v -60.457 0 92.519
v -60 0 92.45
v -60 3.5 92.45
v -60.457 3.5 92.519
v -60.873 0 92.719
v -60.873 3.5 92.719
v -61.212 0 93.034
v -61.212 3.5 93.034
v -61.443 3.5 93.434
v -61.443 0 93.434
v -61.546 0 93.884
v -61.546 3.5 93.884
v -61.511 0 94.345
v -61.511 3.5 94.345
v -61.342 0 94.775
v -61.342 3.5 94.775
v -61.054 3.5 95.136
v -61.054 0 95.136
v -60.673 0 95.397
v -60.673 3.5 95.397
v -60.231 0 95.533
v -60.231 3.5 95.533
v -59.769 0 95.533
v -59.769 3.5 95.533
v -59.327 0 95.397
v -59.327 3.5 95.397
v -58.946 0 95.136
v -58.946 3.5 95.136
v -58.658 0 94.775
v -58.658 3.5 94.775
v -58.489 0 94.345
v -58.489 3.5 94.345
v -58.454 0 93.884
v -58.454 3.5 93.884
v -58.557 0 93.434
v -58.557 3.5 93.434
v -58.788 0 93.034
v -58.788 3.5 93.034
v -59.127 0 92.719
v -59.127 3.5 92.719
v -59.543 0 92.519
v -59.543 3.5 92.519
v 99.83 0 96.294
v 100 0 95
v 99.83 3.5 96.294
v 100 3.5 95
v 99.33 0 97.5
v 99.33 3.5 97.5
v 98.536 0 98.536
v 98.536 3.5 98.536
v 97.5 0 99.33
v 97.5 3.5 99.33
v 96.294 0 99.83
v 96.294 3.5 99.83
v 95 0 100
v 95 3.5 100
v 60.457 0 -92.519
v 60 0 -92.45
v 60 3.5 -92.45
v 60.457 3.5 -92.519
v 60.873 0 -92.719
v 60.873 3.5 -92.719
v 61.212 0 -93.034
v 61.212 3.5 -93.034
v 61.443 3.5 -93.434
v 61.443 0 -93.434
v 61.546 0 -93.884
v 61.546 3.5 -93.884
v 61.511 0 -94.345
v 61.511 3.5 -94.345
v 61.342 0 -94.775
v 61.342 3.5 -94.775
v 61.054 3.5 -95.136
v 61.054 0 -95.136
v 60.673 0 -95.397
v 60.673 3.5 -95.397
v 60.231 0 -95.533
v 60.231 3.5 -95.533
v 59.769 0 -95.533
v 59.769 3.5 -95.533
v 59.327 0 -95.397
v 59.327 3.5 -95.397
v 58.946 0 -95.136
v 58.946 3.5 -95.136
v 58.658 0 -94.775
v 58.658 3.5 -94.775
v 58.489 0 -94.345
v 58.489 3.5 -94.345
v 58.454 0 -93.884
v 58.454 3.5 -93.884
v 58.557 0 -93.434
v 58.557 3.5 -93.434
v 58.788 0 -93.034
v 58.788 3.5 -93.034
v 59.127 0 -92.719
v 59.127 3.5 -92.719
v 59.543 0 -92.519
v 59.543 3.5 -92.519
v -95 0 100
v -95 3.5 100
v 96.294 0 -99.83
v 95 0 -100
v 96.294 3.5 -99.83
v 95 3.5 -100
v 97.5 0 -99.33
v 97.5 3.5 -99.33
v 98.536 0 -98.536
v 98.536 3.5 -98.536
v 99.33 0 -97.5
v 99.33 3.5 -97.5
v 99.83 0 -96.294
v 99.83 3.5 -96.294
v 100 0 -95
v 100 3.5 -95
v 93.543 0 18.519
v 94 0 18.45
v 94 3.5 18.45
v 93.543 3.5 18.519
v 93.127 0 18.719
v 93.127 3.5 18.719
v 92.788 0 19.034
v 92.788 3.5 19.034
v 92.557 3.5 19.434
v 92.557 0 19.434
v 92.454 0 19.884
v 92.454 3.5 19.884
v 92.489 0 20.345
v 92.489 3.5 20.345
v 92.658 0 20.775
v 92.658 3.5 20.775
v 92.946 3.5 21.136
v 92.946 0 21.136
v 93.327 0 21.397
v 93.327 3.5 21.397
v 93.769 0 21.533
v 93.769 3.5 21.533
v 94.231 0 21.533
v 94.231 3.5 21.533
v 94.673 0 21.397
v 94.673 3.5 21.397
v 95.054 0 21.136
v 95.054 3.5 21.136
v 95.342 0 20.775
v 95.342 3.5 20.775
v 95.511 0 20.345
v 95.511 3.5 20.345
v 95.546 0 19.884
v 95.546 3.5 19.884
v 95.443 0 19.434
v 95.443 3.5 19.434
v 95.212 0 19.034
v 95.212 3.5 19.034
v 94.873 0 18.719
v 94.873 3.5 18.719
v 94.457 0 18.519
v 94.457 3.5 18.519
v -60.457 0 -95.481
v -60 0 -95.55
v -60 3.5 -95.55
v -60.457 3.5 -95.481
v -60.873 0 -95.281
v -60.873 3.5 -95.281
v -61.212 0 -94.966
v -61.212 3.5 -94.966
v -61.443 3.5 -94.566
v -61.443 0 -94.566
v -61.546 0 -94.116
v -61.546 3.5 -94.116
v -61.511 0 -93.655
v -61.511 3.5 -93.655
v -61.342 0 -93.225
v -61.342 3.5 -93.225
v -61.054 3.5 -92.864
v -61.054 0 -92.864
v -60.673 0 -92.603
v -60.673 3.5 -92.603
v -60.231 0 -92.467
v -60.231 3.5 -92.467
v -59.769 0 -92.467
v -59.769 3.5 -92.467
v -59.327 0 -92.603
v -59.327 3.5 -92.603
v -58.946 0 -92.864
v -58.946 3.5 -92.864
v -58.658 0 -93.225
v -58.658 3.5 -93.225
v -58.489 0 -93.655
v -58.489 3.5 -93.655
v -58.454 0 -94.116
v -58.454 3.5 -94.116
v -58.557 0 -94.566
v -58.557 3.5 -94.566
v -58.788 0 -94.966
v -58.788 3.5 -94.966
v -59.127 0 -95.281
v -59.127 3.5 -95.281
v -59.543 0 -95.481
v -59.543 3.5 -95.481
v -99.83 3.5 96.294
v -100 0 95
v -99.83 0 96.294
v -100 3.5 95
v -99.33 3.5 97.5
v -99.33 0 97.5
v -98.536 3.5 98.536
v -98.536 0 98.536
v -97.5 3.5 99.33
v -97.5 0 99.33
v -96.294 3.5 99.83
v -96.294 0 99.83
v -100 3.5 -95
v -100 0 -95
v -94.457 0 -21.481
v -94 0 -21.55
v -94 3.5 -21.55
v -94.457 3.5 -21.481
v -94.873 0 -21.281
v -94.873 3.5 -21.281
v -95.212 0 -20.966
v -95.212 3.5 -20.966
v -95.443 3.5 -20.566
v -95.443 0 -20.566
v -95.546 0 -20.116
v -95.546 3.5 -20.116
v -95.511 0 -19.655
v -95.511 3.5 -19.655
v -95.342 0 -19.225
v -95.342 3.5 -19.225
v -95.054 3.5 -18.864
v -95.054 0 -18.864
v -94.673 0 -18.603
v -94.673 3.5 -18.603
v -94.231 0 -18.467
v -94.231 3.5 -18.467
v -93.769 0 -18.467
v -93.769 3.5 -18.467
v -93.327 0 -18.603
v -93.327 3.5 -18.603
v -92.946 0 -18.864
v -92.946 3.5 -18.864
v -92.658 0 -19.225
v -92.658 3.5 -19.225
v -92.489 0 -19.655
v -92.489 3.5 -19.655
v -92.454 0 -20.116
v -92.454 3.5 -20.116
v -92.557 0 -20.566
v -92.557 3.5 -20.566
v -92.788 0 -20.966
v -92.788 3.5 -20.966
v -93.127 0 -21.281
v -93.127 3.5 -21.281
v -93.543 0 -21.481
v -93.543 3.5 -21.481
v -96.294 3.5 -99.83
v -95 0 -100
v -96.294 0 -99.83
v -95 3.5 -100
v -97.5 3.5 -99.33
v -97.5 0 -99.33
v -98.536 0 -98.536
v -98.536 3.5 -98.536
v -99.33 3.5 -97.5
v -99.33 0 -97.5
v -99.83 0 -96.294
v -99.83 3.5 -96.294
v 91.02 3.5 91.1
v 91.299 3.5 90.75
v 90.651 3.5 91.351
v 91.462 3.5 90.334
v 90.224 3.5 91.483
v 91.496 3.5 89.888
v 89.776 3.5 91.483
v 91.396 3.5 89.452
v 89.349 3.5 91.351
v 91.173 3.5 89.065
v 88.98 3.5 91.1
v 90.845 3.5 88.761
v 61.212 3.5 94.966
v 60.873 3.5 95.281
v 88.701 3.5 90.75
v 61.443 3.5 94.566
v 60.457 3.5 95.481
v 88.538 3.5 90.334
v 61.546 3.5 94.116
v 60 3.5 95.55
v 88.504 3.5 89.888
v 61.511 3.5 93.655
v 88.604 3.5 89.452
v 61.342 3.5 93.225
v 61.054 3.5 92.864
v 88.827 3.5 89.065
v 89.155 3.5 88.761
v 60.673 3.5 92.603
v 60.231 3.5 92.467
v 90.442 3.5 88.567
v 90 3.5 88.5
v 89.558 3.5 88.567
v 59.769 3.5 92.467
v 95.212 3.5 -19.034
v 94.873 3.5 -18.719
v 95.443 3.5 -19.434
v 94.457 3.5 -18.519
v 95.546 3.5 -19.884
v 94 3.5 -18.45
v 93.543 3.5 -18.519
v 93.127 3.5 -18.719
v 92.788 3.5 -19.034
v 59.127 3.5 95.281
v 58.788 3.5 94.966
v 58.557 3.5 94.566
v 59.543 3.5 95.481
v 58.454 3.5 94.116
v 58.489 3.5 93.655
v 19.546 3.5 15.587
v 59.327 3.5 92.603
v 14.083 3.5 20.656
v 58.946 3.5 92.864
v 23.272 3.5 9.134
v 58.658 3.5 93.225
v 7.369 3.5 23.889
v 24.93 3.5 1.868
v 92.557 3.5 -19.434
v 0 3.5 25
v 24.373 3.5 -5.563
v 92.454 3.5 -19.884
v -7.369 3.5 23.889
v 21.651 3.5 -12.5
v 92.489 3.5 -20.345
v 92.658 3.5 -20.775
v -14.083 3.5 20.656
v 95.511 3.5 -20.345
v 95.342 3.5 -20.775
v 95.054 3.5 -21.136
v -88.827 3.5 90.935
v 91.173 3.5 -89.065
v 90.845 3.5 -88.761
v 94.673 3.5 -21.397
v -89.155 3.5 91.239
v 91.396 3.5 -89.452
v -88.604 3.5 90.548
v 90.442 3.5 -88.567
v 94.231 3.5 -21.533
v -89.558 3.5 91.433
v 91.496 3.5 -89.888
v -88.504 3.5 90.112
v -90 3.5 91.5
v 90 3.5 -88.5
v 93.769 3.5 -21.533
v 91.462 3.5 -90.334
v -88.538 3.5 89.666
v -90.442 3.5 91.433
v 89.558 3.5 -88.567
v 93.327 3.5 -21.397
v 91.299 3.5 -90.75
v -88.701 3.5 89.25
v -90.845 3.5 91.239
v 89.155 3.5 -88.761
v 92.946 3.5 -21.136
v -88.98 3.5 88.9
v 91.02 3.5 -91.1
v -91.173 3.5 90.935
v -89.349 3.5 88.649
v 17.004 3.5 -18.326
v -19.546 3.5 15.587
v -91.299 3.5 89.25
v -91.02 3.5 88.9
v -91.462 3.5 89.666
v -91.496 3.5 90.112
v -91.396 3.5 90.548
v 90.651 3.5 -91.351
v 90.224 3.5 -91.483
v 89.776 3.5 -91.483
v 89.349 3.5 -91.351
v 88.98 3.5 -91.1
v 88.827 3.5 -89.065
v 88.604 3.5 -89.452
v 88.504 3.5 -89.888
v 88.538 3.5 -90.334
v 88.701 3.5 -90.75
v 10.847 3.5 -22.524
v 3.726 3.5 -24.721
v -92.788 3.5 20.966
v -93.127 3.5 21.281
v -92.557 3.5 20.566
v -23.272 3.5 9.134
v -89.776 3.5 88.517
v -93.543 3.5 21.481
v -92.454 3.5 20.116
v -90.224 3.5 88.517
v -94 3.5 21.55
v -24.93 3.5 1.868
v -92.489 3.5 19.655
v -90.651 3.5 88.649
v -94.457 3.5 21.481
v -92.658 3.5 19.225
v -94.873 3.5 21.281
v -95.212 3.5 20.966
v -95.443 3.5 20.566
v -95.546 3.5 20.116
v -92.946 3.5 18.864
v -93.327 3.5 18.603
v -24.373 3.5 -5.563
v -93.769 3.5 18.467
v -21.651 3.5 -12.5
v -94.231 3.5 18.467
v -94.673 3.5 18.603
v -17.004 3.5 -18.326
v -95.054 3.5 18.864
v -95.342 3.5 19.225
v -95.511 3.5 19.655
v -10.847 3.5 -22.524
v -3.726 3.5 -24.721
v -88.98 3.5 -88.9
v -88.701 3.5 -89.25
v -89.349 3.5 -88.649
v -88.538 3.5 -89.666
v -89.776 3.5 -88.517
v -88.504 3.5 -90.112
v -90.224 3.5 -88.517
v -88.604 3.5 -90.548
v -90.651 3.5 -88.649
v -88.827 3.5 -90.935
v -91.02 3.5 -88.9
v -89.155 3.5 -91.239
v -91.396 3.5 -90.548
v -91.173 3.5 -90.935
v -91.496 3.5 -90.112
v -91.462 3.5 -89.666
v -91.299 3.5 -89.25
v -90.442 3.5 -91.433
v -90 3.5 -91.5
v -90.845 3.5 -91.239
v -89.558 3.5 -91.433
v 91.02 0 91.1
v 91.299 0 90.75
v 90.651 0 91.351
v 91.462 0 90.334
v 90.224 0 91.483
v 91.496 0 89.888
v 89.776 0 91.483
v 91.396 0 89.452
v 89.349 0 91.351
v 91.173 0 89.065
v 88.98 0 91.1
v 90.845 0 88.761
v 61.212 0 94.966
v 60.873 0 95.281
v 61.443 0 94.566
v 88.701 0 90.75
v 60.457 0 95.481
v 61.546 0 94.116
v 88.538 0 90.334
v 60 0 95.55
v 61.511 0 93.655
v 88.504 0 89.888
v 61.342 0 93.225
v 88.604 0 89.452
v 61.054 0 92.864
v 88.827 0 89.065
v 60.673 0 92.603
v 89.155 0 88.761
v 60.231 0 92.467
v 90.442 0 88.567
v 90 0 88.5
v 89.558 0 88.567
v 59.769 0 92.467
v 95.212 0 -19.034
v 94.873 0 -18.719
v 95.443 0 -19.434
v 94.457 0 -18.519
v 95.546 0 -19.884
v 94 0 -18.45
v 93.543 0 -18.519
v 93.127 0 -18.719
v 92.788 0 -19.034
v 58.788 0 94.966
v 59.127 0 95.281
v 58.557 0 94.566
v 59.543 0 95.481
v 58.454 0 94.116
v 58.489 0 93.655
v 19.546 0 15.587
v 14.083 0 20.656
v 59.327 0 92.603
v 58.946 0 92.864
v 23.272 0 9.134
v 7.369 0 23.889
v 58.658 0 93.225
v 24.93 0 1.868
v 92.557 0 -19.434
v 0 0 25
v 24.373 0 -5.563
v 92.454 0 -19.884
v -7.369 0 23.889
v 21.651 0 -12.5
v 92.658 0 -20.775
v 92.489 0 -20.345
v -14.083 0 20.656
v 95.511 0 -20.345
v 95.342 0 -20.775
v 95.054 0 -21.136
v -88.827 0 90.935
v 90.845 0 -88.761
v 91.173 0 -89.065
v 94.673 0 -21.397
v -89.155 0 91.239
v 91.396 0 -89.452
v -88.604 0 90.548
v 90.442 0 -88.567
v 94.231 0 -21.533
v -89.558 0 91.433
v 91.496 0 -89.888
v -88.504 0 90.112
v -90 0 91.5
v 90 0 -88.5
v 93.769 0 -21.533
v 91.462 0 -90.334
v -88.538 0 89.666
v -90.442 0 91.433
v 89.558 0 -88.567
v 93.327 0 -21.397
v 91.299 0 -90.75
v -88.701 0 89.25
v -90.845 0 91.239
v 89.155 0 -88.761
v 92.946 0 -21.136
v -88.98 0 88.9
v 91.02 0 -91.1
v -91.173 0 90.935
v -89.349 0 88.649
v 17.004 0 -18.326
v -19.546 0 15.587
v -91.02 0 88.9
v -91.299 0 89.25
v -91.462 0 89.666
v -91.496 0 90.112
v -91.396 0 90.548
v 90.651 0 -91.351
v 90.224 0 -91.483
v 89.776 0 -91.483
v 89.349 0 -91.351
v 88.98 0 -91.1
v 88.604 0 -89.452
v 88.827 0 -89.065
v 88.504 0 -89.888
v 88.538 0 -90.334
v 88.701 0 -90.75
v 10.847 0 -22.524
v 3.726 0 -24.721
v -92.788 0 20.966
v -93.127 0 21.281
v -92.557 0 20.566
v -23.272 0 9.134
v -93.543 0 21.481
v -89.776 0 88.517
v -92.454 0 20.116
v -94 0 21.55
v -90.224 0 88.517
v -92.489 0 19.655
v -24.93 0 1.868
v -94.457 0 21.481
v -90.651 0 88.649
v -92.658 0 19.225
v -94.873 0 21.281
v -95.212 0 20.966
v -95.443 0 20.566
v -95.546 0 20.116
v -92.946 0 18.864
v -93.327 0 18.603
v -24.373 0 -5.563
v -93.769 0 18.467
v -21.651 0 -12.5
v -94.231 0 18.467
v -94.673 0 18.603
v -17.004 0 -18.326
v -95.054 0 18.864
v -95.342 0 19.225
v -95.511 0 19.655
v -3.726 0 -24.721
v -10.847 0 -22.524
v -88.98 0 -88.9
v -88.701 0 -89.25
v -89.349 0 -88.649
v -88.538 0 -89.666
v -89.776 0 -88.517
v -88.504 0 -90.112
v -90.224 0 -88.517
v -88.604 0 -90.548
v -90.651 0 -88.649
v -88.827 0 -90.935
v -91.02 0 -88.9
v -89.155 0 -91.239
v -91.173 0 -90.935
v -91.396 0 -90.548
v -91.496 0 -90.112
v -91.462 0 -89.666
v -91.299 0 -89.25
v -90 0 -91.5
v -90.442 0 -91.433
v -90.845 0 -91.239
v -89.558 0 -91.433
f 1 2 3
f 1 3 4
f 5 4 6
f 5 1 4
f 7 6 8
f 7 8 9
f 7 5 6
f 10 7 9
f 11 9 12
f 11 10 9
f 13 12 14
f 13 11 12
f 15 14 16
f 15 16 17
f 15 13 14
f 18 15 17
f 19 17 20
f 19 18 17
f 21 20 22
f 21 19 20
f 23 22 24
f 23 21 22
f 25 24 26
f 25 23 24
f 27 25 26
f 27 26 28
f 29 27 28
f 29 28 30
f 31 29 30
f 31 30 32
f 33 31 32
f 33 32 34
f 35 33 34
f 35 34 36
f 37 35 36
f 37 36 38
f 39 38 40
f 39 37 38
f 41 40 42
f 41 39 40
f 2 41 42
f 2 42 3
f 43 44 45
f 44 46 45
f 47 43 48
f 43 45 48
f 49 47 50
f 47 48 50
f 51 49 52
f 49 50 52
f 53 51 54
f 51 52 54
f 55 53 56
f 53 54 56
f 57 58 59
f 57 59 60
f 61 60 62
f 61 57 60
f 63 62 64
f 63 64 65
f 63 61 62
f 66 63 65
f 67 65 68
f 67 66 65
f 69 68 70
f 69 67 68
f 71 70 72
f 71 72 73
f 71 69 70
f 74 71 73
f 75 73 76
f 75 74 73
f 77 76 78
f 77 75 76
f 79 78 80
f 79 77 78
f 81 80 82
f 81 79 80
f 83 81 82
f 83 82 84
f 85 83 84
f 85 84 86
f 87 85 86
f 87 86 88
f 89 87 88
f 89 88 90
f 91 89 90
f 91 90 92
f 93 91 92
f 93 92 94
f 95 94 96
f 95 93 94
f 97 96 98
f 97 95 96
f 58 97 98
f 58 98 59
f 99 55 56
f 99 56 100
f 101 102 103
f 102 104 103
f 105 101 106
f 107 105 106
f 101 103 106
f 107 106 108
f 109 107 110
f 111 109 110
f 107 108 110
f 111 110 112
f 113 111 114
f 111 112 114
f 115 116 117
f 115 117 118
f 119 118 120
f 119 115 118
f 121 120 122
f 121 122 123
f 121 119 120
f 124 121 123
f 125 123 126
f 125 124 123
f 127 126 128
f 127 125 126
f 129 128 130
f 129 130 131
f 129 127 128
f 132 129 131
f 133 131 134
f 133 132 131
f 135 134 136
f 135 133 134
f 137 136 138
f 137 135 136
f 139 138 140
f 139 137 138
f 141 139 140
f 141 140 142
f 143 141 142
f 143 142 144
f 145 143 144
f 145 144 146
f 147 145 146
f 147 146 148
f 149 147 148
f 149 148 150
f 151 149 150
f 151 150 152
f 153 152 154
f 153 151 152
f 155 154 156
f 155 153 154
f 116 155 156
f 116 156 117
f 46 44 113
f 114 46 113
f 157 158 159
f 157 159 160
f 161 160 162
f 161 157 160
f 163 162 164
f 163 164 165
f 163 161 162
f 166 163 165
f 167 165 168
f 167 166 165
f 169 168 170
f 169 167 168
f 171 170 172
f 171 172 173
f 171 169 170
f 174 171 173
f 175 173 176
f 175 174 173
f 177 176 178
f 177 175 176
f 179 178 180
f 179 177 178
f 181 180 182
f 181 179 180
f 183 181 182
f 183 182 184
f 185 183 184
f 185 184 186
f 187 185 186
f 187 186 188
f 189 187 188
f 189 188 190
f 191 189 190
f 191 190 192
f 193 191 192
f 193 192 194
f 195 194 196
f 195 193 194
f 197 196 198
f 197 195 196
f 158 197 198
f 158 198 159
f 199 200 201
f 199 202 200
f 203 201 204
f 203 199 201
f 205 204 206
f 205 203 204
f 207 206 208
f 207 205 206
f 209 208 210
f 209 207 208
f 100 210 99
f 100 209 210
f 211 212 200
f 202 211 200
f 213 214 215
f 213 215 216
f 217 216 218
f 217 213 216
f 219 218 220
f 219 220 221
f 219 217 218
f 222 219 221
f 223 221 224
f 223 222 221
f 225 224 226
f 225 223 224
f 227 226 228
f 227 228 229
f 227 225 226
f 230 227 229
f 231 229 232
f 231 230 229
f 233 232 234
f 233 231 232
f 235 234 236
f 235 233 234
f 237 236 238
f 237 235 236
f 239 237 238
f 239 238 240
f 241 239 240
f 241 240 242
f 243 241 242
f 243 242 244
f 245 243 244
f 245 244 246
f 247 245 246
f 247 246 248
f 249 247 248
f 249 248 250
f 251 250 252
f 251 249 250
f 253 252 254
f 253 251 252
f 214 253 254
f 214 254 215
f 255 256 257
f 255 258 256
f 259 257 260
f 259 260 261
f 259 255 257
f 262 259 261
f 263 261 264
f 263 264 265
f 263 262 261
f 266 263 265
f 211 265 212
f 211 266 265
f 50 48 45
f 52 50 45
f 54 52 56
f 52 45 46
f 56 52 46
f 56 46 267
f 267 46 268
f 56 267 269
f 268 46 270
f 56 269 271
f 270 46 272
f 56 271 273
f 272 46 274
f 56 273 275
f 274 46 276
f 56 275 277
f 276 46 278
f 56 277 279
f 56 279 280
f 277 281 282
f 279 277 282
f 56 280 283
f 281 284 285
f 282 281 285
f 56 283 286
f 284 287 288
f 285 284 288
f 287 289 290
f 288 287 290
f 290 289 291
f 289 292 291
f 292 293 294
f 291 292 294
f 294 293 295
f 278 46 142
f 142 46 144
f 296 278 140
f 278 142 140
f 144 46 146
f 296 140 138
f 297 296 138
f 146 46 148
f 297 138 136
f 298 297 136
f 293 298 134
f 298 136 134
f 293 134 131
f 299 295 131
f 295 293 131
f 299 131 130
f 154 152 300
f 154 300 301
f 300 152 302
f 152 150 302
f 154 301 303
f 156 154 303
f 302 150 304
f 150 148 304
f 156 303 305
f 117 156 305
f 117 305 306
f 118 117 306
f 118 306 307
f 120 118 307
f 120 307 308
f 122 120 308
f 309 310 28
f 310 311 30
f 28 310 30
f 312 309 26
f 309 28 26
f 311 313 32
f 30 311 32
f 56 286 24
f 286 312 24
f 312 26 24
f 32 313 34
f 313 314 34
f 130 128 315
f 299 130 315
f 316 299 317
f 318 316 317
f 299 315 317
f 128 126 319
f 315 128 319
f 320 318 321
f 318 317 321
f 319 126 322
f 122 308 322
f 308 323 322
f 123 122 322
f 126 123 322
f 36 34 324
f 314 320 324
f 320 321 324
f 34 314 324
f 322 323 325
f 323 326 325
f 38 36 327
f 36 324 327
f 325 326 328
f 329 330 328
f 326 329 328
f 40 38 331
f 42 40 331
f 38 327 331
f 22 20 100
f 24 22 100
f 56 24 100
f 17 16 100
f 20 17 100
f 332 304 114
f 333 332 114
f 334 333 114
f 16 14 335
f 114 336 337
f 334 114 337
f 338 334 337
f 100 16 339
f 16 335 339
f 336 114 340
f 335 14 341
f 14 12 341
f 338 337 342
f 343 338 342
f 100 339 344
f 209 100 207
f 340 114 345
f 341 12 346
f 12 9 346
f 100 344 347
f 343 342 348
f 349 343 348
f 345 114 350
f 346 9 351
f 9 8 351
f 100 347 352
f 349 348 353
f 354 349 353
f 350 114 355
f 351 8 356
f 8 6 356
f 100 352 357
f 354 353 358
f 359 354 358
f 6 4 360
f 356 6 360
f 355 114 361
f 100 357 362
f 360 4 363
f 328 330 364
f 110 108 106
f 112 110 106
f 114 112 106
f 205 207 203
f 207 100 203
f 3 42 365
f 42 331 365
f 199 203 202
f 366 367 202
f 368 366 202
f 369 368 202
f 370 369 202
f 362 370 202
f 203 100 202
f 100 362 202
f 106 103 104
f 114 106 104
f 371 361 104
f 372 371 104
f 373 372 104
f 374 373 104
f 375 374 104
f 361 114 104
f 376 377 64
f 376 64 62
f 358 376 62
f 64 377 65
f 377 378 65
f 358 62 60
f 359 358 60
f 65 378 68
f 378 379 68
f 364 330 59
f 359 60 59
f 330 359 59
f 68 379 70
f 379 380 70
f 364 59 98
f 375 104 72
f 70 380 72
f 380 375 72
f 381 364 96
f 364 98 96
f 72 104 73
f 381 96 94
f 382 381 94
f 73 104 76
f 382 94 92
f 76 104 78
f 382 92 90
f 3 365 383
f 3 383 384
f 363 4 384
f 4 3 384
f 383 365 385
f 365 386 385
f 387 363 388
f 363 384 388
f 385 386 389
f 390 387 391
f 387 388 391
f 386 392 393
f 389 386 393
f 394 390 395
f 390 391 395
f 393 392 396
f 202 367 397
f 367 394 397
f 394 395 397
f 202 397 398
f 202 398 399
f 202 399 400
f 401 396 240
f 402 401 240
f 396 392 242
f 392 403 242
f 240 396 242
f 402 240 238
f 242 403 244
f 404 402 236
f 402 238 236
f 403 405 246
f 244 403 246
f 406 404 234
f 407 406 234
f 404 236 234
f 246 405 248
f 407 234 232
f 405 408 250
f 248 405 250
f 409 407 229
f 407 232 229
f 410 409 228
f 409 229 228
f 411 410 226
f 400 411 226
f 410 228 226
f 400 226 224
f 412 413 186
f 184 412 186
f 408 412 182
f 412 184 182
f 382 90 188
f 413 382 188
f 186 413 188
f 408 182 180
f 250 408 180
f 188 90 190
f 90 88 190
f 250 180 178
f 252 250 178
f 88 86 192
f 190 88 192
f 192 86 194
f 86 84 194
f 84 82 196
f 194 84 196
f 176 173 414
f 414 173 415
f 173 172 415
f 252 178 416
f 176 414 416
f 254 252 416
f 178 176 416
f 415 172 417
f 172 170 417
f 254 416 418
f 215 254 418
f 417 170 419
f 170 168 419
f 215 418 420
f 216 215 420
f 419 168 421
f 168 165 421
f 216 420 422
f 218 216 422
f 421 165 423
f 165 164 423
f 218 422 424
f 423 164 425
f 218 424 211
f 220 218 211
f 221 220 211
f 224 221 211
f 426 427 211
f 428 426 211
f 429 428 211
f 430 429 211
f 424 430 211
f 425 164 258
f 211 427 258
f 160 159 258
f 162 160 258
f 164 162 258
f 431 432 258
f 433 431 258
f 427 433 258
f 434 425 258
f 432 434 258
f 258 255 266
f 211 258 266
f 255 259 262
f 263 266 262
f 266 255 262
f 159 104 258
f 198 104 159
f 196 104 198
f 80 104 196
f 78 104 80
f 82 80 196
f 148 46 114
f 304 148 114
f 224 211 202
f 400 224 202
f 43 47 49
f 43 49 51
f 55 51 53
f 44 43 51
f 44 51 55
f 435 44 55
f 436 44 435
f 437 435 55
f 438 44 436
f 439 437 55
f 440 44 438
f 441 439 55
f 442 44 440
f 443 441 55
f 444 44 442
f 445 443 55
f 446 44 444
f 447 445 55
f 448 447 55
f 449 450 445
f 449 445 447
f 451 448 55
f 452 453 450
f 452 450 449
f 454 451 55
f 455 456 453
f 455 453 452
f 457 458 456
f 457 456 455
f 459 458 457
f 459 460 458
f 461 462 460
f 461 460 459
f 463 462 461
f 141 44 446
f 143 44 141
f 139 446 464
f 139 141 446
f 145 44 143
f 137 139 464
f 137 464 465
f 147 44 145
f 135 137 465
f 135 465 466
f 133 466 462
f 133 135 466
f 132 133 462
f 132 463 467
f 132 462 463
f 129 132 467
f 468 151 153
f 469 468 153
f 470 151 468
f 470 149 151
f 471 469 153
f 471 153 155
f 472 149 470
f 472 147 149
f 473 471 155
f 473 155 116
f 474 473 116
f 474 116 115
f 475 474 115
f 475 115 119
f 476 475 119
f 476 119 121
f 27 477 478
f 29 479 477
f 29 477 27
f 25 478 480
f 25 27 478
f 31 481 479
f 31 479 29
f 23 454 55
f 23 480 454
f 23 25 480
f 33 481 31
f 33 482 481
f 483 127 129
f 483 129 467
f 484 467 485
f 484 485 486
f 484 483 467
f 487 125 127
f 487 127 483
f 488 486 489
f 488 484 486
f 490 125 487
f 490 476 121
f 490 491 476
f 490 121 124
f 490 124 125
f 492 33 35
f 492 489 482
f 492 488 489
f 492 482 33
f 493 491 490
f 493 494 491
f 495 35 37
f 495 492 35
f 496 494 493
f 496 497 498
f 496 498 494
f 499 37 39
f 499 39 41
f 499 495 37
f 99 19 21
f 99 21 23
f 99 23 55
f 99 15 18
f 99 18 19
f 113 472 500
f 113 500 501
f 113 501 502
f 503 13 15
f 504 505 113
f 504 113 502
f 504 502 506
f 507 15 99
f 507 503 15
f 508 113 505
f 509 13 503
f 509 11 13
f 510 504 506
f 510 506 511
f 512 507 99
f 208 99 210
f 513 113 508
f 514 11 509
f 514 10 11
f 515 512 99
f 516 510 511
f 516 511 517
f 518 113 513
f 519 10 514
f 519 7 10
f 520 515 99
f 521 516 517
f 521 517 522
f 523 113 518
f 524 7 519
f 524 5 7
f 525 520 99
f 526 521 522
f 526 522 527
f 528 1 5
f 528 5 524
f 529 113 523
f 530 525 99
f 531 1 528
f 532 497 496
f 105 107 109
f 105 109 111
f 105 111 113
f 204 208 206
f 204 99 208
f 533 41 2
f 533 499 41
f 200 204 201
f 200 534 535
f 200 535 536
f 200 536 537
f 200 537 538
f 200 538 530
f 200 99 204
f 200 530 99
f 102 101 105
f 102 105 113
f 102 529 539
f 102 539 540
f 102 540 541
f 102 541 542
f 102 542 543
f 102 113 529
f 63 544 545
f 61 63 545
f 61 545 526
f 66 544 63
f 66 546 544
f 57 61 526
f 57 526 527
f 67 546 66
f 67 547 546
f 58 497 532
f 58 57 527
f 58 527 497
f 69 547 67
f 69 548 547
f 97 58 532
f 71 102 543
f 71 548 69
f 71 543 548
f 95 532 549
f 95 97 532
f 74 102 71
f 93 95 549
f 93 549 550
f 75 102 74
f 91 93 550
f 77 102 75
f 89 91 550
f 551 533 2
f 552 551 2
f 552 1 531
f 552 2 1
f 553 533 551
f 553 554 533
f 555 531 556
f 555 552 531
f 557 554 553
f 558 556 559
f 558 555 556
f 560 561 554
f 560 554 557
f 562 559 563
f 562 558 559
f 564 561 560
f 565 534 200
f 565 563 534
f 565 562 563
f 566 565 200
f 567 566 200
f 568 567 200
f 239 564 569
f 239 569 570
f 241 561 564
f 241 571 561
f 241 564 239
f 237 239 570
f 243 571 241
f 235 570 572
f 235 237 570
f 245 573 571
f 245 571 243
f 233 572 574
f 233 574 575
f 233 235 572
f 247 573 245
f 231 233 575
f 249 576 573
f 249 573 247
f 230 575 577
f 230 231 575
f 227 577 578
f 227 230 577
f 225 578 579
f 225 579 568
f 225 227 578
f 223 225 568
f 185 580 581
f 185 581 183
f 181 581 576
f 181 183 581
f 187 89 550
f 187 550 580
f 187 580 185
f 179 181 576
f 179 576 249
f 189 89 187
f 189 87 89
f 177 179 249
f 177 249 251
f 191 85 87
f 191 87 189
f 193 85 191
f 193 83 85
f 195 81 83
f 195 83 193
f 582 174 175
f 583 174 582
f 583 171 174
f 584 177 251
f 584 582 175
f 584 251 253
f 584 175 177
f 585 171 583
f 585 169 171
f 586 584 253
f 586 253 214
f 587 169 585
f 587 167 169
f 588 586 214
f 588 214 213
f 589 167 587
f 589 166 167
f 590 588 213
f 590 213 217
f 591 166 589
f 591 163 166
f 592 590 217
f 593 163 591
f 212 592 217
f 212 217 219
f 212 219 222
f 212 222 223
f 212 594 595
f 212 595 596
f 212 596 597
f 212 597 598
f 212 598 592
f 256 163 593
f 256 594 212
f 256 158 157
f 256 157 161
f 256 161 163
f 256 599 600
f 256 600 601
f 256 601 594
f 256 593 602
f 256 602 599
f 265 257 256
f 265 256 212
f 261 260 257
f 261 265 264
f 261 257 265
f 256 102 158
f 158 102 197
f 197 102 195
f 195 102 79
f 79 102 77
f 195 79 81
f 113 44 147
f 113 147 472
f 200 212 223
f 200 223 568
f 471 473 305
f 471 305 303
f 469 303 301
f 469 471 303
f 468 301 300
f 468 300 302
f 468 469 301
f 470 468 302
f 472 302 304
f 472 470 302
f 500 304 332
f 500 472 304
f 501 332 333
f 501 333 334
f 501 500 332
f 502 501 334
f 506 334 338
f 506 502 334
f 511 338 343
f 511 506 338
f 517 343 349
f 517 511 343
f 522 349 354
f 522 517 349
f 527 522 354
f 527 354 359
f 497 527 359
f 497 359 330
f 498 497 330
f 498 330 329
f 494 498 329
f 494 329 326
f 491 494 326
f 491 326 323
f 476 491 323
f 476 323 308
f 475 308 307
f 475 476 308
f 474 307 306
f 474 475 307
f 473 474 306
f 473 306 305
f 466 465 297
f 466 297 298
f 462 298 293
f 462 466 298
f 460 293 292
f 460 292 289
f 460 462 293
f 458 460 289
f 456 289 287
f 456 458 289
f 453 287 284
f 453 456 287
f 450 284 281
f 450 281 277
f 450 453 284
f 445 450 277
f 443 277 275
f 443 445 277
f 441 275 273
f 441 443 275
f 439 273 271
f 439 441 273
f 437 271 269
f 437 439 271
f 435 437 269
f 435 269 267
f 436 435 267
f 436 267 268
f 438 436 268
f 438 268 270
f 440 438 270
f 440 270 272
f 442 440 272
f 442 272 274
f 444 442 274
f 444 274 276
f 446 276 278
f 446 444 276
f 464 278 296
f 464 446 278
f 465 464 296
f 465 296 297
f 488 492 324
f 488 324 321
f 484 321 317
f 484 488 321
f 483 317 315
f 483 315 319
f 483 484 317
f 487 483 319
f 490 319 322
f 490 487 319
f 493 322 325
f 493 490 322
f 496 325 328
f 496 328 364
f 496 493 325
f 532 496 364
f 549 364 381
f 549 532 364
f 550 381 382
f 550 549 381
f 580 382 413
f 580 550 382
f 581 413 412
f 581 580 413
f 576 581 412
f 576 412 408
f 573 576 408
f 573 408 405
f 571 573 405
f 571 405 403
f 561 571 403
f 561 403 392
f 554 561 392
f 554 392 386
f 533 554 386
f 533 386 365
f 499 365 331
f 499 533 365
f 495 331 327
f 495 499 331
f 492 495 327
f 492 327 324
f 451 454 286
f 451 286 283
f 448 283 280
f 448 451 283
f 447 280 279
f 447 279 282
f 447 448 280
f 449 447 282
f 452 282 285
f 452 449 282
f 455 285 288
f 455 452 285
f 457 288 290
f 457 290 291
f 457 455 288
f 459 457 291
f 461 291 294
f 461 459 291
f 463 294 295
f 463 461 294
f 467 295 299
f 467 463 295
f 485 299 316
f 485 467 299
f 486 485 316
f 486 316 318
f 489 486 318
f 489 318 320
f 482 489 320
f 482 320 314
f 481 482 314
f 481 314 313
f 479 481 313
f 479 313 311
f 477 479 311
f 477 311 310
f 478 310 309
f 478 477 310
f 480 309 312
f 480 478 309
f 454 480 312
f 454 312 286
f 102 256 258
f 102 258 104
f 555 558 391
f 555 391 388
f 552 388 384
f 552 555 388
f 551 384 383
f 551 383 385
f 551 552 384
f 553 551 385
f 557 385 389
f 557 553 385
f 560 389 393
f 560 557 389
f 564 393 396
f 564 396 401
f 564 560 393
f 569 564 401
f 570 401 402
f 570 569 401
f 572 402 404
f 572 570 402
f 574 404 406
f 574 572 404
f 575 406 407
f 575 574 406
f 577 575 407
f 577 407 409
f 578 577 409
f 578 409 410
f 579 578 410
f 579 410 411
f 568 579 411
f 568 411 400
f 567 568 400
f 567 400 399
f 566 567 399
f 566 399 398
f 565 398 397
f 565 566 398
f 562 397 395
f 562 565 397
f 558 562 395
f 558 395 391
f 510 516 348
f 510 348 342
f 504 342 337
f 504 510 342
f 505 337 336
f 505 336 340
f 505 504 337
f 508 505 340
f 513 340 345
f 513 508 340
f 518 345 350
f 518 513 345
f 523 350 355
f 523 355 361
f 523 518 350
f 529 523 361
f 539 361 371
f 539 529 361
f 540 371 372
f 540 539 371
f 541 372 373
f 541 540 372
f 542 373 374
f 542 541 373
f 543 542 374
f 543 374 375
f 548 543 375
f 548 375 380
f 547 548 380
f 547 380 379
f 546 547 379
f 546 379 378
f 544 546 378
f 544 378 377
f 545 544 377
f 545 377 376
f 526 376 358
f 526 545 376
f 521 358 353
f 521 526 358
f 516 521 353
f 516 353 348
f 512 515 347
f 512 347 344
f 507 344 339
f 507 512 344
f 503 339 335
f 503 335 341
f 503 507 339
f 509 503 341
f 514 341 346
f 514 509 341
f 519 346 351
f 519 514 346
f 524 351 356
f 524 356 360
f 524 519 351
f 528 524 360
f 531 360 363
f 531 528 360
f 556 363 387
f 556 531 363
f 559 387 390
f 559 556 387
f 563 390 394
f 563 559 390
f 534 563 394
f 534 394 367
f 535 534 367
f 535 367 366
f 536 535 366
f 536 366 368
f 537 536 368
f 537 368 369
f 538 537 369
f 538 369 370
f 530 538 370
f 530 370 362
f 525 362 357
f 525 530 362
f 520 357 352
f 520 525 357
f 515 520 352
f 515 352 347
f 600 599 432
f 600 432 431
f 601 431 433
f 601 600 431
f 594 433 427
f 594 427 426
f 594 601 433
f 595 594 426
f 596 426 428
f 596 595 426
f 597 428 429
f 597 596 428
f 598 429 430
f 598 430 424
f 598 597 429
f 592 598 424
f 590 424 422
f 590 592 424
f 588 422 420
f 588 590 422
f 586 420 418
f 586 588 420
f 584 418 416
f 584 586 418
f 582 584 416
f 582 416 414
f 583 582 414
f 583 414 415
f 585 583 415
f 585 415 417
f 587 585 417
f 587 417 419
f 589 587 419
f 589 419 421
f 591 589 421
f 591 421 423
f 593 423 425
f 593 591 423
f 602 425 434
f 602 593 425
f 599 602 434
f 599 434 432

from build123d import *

# Parameters (mm, degrees)
SKETCH_1_R      = 1.55
SKETCH_1_R_2    = 25
SKETCH_1_R_3    = 1.5
EXTRUDE_1_DEPTH = 3.5
FILLET_1_R      = 5


with BuildPart() as part:
    # 草图1 → 凸台-拉伸1 (new body)
    with BuildSketch(Plane(origin=(0, 0, 0), x_dir=(1, 0, 0), z_dir=(0, 1, 0))):
        Polygon((-100, 100), (100, 100), (100, -32.687538375), (100, -80.687538375), (100, -100), (-100, -100), (-100, -80.687538375), (-100, -32.687538375), align=None)
        with Locations(Location((60, 94, 0), (0, 0, 270))):
            Circle(SKETCH_1_R, mode=Mode.SUBTRACT)
        with Locations(Location((60, -94, 0), (0, 0, 270))):
            Circle(SKETCH_1_R, mode=Mode.SUBTRACT)
        with Locations(Location((94, 20, 0), (0, 0, 270))):
            Circle(SKETCH_1_R, mode=Mode.SUBTRACT)
        with Locations(Location((94, -20, 0), (0, 0, 90))):
            Circle(SKETCH_1_R, mode=Mode.SUBTRACT)
        with Locations(Location((-60, -94, 0), (0, 0, 90))):
            Circle(SKETCH_1_R, mode=Mode.SUBTRACT)
        with Locations(Location((-94, -20, 0), (0, 0, 270))):
            Circle(SKETCH_1_R, mode=Mode.SUBTRACT)
        with Locations(Location((-94, 20, 0), (0, 0, 90))):
            Circle(SKETCH_1_R, mode=Mode.SUBTRACT)
        with Locations(Location((-60, 94, 0), (0, 0, 90))):
            Circle(SKETCH_1_R, mode=Mode.SUBTRACT)
        with Locations(Location((0, 0, 0), (0, 0, 270))):
            Circle(SKETCH_1_R_2, mode=Mode.SUBTRACT)
        with Locations(Location((-90, -90, 0), (0, 0, 270))):
            Circle(SKETCH_1_R_3, mode=Mode.SUBTRACT)
        with Locations(Location((-90, 90, 0), (0, 0, 90))):
            Circle(SKETCH_1_R_3, mode=Mode.SUBTRACT)
        with Locations(Location((90, 90, 0), (0, 0, 270))):
            Circle(SKETCH_1_R_3, mode=Mode.SUBTRACT)
        with Locations(Location((90, -90, 0), (0, 0, 90))):
            Circle(SKETCH_1_R_3, mode=Mode.SUBTRACT)
    extrude(amount=EXTRUDE_1_DEPTH)

    # 圆角1
    fillet_1_edges = [part.edges().sort_by_distance(p)[0] for p in [
        (-100, 1.75, -100),
        (100, 1.75, -100),
        (100, 1.75, 100),
        (-100, 1.75, 100),
    ]]
    fillet(fillet_1_edges, radius=FILLET_1_R)


solid = part.part
